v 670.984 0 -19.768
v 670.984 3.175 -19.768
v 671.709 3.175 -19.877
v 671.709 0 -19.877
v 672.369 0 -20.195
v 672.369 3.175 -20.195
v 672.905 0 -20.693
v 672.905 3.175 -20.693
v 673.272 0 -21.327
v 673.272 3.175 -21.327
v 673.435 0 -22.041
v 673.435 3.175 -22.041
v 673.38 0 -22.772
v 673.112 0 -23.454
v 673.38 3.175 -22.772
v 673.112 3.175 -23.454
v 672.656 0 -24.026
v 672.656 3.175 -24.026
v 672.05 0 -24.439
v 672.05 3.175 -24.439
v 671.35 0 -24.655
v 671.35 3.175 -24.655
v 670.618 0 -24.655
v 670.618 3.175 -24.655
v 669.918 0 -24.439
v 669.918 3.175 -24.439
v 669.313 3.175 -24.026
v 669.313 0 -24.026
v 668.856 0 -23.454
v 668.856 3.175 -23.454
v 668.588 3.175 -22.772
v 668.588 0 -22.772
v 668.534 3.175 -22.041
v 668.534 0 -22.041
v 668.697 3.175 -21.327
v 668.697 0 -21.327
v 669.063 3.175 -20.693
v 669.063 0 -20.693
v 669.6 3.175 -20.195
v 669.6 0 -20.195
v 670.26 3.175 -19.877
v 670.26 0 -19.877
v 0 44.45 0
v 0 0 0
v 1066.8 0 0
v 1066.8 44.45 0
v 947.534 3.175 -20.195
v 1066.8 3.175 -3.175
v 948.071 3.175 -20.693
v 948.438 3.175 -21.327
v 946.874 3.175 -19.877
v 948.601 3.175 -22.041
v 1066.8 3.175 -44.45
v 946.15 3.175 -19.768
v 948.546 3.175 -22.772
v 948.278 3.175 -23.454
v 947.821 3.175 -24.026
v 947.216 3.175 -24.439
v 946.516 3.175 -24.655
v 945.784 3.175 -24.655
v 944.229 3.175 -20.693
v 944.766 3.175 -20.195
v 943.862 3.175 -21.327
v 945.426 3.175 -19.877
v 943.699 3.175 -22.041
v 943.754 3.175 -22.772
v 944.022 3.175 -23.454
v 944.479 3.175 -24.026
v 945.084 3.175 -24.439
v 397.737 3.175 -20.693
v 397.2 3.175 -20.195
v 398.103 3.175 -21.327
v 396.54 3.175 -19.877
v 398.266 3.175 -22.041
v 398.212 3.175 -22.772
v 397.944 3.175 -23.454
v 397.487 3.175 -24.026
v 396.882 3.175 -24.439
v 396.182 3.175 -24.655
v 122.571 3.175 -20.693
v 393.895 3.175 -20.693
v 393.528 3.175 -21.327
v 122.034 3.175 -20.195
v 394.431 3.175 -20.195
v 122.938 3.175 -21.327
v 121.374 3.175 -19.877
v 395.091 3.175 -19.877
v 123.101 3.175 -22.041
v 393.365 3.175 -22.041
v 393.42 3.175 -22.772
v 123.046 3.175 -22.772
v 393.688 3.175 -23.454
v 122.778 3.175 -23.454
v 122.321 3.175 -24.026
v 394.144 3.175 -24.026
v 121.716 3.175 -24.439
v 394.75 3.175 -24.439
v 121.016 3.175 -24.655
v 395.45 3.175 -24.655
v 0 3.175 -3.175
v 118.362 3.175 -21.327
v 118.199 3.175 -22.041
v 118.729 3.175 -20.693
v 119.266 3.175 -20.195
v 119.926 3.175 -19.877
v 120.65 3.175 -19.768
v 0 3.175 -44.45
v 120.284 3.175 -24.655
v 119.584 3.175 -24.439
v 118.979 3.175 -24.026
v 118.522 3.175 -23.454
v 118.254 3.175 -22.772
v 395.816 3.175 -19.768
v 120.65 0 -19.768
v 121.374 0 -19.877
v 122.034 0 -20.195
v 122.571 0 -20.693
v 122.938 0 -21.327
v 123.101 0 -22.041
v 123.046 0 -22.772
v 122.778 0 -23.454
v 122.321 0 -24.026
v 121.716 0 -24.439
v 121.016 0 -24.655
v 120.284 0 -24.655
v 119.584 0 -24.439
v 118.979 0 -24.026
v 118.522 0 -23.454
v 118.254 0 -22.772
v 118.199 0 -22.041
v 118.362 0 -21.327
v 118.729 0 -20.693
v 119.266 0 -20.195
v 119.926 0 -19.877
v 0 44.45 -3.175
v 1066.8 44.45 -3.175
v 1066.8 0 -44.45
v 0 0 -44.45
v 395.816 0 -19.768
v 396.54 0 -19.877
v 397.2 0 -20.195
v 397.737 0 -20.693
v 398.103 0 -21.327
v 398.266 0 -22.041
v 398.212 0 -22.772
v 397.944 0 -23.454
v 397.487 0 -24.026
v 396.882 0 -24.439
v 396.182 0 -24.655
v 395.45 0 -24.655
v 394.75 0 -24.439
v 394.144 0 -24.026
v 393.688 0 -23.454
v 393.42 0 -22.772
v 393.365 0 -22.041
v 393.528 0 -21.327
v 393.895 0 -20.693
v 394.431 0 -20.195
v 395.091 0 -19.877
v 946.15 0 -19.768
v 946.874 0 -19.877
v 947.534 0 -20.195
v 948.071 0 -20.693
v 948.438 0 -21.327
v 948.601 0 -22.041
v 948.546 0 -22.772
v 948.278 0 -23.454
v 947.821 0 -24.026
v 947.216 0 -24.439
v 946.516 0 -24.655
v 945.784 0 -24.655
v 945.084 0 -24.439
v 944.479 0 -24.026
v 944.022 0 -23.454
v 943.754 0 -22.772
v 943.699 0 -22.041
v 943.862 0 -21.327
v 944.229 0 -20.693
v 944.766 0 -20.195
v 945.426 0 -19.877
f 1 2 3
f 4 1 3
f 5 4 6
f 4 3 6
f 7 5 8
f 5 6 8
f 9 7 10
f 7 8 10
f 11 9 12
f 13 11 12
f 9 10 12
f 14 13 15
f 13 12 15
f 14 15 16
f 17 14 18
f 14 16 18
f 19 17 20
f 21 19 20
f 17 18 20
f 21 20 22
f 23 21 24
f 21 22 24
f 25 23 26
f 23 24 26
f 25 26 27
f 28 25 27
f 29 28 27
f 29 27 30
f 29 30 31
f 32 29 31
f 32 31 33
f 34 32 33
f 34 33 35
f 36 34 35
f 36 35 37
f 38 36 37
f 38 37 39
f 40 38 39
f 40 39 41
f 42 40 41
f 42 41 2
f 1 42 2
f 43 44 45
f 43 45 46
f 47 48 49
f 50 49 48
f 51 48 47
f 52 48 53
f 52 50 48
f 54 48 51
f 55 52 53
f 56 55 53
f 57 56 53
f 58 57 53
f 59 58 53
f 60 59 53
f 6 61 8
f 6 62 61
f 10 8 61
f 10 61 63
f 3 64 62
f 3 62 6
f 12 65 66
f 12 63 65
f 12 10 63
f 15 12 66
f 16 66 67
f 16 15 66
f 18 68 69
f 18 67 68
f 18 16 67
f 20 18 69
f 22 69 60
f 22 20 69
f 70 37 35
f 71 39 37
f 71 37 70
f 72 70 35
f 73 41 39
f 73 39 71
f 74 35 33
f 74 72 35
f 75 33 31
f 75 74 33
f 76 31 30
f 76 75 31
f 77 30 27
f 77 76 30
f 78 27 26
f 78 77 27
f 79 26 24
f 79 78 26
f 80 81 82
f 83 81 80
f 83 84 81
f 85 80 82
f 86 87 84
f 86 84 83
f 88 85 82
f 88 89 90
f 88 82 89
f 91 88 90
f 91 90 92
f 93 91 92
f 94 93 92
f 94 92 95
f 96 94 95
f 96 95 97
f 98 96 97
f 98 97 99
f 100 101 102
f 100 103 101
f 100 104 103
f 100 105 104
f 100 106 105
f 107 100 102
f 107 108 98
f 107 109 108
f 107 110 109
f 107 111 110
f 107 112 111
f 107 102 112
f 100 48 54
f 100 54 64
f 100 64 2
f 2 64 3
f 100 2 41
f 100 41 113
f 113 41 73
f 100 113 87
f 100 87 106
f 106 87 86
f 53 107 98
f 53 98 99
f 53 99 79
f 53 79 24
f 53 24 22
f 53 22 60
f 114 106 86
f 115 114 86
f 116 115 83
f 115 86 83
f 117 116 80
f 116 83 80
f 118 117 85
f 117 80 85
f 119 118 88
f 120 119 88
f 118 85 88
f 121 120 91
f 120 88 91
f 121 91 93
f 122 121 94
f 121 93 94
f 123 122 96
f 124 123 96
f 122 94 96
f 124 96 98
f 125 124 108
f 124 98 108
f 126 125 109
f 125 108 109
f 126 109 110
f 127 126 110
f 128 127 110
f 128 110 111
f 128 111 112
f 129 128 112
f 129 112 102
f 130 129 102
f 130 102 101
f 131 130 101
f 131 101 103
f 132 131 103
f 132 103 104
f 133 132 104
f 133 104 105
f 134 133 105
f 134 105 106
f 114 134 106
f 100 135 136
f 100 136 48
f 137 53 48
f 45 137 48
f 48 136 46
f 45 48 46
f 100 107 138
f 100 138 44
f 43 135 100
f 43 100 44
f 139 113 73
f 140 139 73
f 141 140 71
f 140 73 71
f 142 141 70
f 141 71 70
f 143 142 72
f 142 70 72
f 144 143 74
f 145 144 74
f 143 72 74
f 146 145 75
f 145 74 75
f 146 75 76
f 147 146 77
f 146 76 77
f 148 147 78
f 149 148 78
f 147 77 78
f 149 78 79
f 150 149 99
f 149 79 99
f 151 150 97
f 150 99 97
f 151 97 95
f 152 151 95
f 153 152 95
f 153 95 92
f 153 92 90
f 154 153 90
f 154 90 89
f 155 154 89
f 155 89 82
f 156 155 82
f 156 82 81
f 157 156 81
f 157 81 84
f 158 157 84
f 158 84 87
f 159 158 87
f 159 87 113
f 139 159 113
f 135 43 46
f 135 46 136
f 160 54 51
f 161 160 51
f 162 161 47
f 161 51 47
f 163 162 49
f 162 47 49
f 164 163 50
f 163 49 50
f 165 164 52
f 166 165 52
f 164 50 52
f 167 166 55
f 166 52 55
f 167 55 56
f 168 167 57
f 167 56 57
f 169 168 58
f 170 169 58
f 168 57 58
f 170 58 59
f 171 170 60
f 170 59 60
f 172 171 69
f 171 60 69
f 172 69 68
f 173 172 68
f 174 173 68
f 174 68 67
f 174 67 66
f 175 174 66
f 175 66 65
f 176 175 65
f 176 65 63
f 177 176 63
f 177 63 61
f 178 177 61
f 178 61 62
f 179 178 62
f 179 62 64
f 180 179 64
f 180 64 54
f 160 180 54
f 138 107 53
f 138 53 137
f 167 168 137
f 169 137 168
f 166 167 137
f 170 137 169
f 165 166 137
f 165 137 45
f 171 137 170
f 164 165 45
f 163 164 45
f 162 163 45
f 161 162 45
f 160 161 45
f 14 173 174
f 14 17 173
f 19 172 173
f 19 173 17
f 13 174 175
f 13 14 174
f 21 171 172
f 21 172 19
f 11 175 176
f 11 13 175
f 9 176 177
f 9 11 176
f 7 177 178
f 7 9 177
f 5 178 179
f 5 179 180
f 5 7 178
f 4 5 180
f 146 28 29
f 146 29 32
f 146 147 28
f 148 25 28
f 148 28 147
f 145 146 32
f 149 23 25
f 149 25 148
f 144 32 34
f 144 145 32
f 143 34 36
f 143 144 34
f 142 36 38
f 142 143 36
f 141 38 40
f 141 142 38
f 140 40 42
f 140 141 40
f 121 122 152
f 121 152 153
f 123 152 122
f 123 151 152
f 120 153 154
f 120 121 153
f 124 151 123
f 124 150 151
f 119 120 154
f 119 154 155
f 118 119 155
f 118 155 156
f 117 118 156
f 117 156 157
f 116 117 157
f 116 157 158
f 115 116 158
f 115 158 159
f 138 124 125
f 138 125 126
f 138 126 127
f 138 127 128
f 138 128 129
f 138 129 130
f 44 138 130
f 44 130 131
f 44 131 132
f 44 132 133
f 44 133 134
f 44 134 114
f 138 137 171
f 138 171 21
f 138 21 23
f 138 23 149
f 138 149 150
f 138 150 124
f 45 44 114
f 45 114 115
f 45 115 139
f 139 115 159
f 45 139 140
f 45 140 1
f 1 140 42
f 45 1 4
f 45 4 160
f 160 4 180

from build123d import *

# Parameters (mm, degrees)
BOSS_EXTRUDE1_DEPTH = 1066.8
SKETCH2_R           = 2.45745
CUT_EXTRUDE1_DEPTH  = 889


with BuildPart() as part:
    # Sketch1 → Boss-Extrude1 (new body)
    with BuildSketch(Plane(origin=(0, 0, 0), x_dir=(0, 0, -1), z_dir=(1, 0, 0))):
        Polygon((0, 0), (0, 44.45), (3.175, 44.45), (3.175, 3.175), (44.45, 3.175), (44.45, 0), align=None)
    extrude(amount=BOSS_EXTRUDE1_DEPTH)

    # Sketch2 → Cut-Extrude1 (cut)
    with BuildSketch(Plane(origin=(0, 3.175, 0), x_dir=(1, 0, 0), z_dir=(0, 1, 0))):
        with Locations(Location((120.65, 22.225, 0), (0, 0, 270))):
            Circle(SKETCH2_R)
        with Locations(Location((395.81582, 22.225, 0), (0, 0, 270))):
            Circle(SKETCH2_R)
        with Locations(Location((670.98418, 22.225, 0), (0, 0, 270))):
            Circle(SKETCH2_R)
        with Locations(Location((946.15, 22.225, 0), (0, 0, 270))):
            Circle(SKETCH2_R)
    extrude(amount=-CUT_EXTRUDE1_DEPTH, mode=Mode.SUBTRACT)


solid = part.part
